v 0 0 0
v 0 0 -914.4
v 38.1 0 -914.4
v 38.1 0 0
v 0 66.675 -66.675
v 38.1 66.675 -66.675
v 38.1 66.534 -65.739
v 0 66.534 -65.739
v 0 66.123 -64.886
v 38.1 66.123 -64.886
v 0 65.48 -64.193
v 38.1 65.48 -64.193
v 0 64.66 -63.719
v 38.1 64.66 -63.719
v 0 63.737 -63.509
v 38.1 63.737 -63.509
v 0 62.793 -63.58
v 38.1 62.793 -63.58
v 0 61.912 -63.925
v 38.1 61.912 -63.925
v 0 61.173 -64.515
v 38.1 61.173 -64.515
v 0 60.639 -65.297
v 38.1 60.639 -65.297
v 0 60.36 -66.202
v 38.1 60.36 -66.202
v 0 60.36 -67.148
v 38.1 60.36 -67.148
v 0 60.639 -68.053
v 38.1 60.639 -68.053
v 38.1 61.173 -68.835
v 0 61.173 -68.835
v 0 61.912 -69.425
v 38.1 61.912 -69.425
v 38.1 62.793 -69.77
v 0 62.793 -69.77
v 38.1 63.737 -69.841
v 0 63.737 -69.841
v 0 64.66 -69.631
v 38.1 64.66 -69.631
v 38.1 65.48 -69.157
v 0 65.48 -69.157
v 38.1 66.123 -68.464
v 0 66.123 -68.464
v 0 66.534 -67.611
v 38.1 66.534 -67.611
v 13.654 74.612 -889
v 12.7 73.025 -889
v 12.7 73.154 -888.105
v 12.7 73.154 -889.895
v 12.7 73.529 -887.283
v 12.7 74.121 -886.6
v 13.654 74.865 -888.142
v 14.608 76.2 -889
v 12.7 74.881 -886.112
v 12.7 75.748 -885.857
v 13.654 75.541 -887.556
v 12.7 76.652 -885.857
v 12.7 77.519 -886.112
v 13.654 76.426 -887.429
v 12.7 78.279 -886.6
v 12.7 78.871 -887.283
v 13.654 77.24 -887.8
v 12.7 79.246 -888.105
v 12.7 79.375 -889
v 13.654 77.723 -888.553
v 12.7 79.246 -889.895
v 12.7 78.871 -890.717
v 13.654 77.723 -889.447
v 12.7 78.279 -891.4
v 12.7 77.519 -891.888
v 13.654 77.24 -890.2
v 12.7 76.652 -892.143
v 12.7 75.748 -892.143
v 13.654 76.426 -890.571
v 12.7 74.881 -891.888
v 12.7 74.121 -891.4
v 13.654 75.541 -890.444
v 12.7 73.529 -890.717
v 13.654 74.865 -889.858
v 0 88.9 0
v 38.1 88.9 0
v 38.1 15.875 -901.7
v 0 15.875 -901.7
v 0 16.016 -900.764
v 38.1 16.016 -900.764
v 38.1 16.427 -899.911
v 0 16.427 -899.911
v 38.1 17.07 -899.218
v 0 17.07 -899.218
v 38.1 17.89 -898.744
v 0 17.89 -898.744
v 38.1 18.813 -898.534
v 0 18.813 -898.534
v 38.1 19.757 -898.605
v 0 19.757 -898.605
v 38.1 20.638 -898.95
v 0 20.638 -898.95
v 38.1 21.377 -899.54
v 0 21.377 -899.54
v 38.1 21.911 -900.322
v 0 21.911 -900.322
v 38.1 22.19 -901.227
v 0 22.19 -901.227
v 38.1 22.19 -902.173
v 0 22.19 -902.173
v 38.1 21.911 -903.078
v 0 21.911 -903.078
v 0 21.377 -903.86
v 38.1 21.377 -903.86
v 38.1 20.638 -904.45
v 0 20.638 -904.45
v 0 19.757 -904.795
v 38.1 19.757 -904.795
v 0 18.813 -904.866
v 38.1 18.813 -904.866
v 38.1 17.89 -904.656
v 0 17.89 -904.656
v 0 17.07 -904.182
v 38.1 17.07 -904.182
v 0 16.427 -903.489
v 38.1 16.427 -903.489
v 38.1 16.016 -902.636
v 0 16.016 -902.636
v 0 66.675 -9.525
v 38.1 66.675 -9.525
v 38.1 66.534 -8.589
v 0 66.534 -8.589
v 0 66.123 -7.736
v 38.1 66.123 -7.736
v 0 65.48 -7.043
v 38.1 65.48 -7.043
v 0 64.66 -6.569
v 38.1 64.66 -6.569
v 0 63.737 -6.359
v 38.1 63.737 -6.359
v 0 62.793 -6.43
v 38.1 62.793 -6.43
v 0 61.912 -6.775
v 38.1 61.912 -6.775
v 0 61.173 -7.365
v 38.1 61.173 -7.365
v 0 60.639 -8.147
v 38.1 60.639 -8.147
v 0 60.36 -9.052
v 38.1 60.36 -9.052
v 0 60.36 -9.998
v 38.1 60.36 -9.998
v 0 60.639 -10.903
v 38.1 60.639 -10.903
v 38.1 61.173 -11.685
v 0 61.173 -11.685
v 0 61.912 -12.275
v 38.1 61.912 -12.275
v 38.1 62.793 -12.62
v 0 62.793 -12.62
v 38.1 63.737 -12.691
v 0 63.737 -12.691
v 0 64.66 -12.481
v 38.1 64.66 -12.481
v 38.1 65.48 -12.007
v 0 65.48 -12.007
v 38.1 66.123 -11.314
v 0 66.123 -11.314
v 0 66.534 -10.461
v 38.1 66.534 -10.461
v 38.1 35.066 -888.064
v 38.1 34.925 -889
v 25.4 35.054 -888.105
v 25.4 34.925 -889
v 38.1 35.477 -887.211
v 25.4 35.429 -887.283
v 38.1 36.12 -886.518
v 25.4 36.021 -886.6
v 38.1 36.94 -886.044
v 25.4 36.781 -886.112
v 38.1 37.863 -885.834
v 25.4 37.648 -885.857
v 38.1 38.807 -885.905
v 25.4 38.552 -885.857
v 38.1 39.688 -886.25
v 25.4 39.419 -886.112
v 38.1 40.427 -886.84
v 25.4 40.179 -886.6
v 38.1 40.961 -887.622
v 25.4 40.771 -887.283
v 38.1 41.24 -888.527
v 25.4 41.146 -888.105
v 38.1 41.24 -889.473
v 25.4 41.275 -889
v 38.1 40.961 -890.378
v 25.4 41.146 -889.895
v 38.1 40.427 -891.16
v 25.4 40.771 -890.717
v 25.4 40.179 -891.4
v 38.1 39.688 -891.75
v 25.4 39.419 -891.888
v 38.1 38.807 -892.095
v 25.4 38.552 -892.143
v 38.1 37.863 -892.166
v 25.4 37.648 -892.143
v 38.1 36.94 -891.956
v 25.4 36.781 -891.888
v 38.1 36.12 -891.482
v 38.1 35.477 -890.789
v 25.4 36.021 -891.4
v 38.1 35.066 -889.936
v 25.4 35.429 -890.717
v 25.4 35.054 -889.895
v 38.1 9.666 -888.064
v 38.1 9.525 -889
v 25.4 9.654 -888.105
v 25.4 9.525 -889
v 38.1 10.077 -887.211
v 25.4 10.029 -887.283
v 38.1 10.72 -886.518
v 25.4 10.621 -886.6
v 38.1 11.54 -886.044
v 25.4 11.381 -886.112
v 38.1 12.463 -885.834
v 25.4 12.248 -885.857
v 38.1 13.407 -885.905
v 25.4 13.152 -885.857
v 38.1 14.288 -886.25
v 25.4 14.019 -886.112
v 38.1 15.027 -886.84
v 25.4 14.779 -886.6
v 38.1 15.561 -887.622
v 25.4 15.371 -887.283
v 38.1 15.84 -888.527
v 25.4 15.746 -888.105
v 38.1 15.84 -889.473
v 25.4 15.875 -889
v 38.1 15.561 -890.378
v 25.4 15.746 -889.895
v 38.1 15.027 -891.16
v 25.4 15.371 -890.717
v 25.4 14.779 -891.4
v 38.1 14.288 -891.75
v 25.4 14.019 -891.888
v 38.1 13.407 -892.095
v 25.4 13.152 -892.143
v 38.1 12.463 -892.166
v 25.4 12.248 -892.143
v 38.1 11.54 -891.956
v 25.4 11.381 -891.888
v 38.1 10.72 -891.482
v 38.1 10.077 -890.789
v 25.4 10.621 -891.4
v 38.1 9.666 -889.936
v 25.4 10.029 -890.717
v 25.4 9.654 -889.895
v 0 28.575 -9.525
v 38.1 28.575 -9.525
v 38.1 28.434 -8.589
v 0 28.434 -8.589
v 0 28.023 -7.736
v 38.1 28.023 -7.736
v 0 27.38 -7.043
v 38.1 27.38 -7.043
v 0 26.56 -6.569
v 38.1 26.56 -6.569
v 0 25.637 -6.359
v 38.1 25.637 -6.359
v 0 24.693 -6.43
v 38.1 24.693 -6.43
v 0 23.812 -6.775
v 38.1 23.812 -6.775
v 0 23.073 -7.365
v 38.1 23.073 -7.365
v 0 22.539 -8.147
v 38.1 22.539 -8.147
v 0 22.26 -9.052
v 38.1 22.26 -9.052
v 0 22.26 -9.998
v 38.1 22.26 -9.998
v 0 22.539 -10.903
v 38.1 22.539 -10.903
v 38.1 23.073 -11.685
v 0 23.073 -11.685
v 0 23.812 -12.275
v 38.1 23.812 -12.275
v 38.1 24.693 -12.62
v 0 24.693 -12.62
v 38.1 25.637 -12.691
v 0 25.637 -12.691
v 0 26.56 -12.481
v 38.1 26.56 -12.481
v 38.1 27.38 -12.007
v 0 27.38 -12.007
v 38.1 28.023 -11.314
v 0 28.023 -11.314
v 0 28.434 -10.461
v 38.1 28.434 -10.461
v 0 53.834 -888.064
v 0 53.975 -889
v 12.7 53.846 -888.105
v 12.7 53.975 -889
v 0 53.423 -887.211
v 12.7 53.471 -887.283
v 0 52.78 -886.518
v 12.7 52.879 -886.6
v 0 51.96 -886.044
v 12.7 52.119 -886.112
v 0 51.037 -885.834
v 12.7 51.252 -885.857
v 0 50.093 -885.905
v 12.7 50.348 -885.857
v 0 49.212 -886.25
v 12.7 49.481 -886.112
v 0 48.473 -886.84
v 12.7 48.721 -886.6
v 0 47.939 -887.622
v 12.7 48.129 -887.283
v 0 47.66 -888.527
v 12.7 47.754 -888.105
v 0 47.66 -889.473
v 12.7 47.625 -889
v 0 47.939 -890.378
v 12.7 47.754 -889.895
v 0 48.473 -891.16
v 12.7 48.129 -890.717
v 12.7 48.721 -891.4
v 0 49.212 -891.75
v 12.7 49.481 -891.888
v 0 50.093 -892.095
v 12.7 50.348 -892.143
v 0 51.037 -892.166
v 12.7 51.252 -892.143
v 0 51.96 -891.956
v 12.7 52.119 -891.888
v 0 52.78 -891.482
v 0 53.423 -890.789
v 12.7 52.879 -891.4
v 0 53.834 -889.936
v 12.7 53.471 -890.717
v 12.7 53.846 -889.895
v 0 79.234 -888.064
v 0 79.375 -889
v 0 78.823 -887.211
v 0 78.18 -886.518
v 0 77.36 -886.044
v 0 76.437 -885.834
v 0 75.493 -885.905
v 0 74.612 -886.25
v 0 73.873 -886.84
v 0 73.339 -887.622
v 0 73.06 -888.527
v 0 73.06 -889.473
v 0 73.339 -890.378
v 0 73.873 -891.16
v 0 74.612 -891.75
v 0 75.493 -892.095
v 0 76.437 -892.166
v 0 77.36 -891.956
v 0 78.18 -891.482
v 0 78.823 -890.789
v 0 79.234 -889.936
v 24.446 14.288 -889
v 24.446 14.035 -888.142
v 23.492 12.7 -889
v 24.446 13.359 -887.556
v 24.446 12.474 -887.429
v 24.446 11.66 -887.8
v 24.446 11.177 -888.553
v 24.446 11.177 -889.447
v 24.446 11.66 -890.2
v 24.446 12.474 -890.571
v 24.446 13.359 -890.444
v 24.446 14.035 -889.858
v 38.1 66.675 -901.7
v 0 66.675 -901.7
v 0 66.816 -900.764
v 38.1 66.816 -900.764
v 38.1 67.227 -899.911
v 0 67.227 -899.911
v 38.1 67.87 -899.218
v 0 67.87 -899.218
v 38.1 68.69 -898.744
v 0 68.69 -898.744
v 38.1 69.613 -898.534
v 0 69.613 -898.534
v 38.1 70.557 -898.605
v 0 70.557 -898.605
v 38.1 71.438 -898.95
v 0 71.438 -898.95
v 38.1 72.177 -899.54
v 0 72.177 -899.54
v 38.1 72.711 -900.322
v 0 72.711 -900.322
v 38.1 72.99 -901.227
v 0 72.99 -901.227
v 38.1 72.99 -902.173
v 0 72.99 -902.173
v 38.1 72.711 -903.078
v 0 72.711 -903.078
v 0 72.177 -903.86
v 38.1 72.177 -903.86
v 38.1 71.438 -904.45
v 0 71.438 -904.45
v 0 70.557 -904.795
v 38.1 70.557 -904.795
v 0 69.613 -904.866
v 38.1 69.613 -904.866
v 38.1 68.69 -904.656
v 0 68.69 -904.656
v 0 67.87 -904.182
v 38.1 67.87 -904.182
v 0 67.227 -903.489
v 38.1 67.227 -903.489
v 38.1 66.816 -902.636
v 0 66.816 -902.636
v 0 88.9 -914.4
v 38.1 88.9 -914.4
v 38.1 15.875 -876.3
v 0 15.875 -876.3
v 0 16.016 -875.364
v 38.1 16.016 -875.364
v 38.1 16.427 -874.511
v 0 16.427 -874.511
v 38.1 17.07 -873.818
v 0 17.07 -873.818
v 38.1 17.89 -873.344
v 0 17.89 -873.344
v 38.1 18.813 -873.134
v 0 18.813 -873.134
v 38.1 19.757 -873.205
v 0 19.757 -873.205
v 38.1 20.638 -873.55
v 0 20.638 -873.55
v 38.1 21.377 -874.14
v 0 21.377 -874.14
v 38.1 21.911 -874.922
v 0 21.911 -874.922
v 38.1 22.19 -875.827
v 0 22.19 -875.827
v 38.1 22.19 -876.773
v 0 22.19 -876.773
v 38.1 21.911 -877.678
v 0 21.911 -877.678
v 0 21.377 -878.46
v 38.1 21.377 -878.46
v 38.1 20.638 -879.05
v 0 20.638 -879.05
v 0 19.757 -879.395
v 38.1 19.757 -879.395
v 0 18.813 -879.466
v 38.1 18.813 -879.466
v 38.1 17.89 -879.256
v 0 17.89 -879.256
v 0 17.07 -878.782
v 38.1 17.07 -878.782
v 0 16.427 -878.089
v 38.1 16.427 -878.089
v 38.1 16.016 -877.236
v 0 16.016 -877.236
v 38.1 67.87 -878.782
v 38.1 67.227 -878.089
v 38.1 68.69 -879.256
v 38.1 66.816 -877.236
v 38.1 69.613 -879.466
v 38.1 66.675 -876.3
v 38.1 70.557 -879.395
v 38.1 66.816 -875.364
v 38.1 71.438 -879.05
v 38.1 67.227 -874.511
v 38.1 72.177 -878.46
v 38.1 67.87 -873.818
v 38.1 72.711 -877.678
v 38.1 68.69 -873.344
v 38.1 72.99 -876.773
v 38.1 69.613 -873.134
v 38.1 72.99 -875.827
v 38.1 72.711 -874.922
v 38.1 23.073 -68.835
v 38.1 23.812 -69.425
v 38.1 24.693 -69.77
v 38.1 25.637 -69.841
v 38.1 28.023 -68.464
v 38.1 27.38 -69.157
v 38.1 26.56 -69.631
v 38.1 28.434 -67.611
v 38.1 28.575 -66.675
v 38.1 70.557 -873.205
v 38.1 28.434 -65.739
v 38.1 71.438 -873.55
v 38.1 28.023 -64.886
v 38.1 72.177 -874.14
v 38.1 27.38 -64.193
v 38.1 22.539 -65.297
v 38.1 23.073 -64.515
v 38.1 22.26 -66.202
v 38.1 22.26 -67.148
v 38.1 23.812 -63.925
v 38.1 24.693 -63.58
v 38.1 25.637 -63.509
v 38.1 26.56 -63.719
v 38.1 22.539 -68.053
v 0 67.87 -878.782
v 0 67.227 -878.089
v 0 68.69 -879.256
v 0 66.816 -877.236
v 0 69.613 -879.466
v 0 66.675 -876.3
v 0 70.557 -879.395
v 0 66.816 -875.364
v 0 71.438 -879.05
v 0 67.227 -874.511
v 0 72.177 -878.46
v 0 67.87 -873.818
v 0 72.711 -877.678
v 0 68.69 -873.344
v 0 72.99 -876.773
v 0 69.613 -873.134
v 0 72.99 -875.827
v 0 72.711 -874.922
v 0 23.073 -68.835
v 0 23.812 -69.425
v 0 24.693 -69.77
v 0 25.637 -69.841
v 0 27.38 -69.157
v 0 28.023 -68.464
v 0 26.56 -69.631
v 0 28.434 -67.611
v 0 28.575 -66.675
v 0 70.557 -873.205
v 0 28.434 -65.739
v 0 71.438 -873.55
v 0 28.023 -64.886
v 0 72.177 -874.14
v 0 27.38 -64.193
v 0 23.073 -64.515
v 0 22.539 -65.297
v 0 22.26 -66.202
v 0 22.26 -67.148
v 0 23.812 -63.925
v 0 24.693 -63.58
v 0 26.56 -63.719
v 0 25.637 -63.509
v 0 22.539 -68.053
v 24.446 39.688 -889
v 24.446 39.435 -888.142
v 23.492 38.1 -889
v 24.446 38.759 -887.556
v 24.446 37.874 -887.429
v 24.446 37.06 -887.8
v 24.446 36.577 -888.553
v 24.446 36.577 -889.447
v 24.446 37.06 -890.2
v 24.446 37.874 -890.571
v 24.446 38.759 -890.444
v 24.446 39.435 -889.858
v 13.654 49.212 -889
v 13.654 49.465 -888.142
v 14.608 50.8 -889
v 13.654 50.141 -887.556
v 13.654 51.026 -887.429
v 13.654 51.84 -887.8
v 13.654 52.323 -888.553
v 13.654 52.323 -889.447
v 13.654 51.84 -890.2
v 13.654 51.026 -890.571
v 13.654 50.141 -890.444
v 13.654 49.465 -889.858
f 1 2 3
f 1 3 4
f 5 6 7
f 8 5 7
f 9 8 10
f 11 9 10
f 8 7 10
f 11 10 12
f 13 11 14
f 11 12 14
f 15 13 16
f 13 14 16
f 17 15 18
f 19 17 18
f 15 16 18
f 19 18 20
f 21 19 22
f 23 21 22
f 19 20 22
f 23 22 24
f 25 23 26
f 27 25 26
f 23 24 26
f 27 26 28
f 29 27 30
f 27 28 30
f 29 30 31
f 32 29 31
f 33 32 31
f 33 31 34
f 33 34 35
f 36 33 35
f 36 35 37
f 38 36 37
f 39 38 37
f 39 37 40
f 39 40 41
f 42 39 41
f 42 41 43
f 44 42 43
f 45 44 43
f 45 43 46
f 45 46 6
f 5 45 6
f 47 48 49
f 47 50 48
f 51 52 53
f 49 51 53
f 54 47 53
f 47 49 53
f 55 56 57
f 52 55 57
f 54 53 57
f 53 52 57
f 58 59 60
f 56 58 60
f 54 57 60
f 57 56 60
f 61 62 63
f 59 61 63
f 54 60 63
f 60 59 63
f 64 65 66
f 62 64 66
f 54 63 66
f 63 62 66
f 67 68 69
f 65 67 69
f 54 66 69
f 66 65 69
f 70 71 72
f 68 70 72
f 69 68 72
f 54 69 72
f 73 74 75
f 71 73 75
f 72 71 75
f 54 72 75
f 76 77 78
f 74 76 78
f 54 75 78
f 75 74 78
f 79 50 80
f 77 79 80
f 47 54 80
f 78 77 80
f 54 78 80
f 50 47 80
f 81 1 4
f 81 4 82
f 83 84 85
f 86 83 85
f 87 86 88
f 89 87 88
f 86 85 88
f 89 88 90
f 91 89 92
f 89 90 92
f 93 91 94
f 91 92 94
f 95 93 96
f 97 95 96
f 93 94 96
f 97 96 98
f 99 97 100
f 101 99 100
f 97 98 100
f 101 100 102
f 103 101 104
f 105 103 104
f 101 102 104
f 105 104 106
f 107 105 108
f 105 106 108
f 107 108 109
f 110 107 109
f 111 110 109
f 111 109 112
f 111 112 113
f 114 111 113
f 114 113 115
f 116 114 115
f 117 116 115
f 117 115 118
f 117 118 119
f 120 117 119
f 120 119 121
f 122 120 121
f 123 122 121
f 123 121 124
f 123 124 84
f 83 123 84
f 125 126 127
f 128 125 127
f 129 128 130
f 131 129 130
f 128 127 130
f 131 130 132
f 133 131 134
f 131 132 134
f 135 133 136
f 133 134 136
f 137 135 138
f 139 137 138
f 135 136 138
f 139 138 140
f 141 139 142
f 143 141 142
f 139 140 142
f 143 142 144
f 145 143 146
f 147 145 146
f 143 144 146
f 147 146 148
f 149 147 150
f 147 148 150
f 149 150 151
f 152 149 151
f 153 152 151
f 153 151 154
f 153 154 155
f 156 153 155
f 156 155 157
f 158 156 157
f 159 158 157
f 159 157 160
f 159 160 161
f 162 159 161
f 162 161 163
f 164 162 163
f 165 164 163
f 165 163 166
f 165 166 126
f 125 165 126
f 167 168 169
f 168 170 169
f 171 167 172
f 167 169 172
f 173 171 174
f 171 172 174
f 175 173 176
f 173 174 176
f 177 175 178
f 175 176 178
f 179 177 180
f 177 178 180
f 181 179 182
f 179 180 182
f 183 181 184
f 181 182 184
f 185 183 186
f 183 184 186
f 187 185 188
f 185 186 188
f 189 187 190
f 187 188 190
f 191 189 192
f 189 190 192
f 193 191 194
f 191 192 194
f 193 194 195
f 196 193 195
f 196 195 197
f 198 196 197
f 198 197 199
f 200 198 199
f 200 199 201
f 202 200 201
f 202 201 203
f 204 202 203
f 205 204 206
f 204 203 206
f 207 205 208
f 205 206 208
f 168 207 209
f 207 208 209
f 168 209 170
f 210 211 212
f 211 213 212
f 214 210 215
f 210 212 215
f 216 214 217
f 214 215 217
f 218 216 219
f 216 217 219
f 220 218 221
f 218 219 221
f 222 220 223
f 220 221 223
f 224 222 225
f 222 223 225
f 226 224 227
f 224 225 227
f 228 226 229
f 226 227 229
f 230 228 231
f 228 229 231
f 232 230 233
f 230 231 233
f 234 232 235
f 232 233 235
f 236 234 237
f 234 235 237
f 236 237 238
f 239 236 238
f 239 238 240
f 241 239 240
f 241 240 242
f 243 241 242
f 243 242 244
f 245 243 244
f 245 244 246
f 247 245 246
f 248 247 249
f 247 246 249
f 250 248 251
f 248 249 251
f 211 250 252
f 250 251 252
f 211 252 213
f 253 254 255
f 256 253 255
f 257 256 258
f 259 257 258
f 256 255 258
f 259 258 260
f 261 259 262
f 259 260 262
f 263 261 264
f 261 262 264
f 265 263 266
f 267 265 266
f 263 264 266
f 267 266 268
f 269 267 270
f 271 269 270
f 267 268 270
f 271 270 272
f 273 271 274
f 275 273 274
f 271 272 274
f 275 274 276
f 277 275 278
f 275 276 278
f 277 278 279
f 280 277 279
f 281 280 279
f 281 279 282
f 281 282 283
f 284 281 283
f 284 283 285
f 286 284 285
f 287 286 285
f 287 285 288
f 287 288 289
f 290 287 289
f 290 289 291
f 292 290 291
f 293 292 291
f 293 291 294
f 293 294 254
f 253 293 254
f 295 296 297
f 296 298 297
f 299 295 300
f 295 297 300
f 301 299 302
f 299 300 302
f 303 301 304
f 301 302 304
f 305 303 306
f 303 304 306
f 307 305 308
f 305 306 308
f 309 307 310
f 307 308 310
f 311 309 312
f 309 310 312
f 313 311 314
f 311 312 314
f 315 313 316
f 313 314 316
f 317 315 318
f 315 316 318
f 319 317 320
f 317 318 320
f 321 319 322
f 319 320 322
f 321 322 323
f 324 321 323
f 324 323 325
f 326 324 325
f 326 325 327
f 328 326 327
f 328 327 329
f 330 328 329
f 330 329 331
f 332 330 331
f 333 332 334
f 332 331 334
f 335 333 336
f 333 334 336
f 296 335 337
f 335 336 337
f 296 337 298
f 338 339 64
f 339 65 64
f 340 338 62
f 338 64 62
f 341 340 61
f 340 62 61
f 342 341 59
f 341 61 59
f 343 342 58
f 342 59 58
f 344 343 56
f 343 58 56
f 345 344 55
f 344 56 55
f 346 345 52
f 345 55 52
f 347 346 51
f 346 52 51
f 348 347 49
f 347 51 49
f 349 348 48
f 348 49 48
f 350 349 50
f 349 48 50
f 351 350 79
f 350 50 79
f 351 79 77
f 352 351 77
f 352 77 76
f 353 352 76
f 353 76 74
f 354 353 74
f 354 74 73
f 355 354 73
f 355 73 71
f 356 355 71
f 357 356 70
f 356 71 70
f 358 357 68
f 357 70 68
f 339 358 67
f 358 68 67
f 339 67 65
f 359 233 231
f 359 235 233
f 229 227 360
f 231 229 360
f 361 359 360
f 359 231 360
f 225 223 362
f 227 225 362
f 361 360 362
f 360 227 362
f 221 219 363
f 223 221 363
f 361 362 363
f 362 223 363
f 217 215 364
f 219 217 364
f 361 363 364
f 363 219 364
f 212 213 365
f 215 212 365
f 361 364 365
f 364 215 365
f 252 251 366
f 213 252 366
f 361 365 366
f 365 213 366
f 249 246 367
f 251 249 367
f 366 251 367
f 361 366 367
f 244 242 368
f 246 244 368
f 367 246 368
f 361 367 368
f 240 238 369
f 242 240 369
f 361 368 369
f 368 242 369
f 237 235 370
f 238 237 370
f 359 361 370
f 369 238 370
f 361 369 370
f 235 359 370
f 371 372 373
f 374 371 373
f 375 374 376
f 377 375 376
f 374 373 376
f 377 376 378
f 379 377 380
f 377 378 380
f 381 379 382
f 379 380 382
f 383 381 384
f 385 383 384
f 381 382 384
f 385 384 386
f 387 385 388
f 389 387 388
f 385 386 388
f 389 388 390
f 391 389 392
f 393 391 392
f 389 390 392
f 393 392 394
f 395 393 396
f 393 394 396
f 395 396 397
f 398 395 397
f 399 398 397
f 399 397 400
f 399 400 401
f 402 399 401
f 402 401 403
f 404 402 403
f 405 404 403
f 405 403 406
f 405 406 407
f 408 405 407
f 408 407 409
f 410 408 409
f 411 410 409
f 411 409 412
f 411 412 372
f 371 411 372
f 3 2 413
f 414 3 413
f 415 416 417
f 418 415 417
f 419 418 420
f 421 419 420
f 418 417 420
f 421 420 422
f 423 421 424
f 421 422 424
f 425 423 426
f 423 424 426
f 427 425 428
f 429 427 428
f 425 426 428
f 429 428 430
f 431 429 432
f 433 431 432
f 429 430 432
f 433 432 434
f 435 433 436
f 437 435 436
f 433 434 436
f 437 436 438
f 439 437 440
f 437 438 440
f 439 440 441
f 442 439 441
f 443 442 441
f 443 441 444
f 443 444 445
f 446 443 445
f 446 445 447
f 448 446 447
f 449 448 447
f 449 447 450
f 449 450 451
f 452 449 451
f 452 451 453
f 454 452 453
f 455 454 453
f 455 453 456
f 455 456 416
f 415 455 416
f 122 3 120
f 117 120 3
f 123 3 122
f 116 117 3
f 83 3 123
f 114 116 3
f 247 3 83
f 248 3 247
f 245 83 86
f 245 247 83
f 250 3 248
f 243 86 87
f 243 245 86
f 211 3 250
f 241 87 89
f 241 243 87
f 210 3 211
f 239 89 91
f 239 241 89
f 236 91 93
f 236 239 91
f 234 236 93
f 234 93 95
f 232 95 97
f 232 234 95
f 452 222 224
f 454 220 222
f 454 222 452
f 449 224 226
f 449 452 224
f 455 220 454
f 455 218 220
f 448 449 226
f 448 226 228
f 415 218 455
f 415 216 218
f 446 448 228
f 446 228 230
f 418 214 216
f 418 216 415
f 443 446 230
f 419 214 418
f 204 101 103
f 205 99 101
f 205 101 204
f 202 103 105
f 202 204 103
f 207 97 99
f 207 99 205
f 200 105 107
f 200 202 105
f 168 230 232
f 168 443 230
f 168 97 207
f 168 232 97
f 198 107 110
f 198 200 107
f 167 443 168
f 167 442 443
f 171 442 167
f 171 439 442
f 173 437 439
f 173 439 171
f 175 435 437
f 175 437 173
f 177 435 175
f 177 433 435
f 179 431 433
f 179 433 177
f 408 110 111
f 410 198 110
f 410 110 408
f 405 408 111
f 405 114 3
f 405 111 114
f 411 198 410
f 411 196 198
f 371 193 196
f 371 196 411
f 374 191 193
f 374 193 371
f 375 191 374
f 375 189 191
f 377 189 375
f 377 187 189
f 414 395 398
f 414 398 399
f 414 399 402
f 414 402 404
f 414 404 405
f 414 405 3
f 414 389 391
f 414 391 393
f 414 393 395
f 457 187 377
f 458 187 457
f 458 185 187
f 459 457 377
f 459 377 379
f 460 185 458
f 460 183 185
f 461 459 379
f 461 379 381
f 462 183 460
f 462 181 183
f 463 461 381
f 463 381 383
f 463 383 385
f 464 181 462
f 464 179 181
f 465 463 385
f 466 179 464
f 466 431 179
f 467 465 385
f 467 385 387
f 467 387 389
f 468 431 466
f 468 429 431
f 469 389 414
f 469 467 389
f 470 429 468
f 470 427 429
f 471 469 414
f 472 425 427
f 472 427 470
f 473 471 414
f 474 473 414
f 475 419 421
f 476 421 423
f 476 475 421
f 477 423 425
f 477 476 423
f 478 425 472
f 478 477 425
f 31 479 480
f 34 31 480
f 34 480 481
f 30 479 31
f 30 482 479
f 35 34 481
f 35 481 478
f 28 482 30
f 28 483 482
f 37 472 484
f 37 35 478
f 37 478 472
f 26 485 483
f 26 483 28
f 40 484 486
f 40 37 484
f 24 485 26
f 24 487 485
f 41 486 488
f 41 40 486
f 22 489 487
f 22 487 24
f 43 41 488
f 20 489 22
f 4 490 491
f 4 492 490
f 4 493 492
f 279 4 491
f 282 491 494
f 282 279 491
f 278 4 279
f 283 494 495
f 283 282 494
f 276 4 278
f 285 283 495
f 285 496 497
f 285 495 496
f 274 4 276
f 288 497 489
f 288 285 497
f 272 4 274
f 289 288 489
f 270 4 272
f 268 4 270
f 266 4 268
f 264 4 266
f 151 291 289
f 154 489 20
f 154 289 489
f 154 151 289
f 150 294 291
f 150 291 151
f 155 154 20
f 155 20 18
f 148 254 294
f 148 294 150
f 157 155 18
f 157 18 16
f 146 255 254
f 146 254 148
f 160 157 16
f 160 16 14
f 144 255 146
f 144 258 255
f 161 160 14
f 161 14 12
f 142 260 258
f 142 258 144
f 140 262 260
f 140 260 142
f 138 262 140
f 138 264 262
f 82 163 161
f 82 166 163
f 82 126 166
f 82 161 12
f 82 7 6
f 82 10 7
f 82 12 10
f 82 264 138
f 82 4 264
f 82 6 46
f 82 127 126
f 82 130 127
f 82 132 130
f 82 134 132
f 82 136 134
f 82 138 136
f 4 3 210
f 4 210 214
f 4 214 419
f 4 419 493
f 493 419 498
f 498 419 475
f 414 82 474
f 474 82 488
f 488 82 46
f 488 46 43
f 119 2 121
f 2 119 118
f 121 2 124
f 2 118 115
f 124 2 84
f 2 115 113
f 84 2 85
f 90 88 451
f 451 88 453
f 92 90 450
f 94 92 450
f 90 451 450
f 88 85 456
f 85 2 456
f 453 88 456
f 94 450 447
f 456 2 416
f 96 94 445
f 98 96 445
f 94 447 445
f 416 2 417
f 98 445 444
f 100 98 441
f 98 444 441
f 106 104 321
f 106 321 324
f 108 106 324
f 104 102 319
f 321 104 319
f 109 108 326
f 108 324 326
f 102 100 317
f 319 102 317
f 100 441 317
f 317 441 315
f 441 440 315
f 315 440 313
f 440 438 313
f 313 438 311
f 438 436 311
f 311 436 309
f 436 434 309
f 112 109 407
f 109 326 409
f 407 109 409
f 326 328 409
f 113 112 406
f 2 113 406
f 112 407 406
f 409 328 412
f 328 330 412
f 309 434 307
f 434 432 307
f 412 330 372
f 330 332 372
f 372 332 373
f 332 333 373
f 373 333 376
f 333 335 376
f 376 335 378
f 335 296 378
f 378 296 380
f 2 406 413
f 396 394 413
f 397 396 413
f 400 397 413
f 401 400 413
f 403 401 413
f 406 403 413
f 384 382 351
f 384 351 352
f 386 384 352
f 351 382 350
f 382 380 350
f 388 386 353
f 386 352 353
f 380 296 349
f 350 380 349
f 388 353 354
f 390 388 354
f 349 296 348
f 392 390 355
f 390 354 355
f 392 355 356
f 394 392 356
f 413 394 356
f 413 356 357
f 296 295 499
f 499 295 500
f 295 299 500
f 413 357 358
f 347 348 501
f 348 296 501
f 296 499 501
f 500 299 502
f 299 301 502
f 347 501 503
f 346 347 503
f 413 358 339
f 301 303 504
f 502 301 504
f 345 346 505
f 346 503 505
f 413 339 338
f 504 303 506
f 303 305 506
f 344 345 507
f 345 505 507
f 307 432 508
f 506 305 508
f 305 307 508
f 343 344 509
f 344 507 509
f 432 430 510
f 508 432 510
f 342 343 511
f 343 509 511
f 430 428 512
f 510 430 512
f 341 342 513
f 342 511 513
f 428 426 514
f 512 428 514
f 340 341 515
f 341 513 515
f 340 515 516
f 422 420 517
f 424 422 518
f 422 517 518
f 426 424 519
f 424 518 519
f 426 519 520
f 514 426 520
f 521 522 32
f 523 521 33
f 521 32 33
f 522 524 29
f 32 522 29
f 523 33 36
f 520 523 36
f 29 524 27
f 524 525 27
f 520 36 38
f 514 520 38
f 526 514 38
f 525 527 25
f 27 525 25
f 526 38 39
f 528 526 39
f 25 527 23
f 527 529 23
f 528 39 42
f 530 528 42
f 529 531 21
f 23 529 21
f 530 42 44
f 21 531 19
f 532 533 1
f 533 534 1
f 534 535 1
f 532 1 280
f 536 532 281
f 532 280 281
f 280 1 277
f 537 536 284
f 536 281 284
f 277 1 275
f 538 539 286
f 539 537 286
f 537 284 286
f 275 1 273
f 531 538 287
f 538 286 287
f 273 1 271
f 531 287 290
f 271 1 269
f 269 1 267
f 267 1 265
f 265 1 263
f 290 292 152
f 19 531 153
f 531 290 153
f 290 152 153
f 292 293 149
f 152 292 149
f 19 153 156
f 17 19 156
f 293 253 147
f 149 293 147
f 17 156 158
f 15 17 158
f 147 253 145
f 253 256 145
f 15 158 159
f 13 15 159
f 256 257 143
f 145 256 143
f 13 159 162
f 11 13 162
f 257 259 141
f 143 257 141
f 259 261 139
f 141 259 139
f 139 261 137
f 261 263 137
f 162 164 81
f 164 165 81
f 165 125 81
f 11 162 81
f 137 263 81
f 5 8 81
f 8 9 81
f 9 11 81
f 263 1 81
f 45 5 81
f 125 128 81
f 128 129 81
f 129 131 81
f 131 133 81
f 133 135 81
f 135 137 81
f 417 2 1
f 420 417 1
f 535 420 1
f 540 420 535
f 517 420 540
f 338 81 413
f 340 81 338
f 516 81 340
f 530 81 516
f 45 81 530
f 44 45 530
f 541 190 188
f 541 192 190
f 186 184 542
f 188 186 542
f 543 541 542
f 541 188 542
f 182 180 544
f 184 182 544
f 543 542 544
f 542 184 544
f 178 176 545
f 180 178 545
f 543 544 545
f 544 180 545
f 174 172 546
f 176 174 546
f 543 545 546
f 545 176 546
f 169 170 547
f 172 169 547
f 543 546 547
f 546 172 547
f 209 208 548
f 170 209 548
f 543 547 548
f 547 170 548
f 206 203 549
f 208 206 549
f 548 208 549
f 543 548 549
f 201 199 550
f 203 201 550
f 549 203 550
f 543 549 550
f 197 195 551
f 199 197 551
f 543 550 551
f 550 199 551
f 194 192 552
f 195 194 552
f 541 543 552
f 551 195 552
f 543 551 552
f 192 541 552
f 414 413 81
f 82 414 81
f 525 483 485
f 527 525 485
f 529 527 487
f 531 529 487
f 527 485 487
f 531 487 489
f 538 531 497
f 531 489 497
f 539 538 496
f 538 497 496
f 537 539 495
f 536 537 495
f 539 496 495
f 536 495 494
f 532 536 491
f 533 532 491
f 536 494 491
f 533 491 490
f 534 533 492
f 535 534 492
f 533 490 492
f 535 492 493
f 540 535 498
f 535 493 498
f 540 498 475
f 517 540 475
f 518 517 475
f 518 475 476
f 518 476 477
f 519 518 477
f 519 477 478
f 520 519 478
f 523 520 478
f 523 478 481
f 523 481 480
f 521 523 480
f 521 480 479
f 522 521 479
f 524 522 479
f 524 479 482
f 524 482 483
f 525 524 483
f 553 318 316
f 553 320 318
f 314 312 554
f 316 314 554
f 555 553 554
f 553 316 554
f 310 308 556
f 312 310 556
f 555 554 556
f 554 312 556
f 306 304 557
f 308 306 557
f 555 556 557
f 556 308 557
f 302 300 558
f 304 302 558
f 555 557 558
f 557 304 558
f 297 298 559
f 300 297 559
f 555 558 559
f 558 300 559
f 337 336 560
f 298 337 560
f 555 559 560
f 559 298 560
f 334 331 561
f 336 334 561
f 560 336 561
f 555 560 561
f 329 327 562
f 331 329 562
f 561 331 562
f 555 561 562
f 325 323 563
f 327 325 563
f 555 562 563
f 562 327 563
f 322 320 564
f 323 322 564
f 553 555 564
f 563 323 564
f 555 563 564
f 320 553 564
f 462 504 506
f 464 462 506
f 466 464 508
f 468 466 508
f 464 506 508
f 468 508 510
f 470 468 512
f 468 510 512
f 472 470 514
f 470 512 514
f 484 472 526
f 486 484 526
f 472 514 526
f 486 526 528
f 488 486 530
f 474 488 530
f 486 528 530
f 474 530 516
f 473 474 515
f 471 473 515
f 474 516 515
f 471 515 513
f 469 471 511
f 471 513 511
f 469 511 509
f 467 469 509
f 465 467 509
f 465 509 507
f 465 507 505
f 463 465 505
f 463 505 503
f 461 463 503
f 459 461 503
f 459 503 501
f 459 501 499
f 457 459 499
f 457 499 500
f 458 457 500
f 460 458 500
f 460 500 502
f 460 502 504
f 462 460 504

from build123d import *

# Parameters (mm, degrees)
F0_W     = 88.9
F0_H     = 914.4
F1_DEPTH = 38.1
F3_D     = 6.35
F5_D     = 6.35
F7_D     = 6.35
F7_DEPTH = 12.7
F7_TIP   = 1.9077324654
F9_D     = 6.35
F9_DEPTH = 12.7
F9_TIP   = 1.9077324654


with BuildPart() as f1:
    # F0 (on Right) → F1 (new body)
    with BuildSketch(Plane.YZ):
        with Locations((44.45, -457.2)):
            Rectangle(F0_W, F0_H)
    extrude(amount=F1_DEPTH)

    # F3 (through all)
    with Locations(Plane(origin=(0, 0, 0), x_dir=(0, -1, 0), z_dir=(-1, 0, 0))):
        with Locations((-63.5, -9.525), (-25.4, -9.525), (-63.5, -66.675), (-25.4, -66.675)):
            Hole(F3_D / 2)

    # F5 (through all)
    with Locations(Plane.YZ.offset(38.1)):
        with Locations((19.05, -876.3), (19.05, -901.7), (69.85, -876.3), (69.85, -901.7)):
            Hole(F5_D / 2)

    # F7
    with Locations(Plane(origin=(0, 0, 0), x_dir=(0, -1, 0), z_dir=(-1, 0, 0))):
        with Locations((-76.2, -889), (-50.8, -889)):
            Hole(F7_D / 2, depth=F7_DEPTH)
            with Locations((0, 0, -(F7_DEPTH + F7_TIP / 2))):  # 118° drill point
                Cone(0, F7_D / 2, F7_TIP, mode=Mode.SUBTRACT)

    # F9
    with Locations(Plane.YZ.offset(38.1)):
        with Locations((12.7, -889), (38.1, -889)):
            Hole(F9_D / 2, depth=F9_DEPTH)
            with Locations((0, 0, -(F9_DEPTH + F9_TIP / 2))):  # 118° drill point
                Cone(0, F9_D / 2, F9_TIP, mode=Mode.SUBTRACT)


solid = f1.part
